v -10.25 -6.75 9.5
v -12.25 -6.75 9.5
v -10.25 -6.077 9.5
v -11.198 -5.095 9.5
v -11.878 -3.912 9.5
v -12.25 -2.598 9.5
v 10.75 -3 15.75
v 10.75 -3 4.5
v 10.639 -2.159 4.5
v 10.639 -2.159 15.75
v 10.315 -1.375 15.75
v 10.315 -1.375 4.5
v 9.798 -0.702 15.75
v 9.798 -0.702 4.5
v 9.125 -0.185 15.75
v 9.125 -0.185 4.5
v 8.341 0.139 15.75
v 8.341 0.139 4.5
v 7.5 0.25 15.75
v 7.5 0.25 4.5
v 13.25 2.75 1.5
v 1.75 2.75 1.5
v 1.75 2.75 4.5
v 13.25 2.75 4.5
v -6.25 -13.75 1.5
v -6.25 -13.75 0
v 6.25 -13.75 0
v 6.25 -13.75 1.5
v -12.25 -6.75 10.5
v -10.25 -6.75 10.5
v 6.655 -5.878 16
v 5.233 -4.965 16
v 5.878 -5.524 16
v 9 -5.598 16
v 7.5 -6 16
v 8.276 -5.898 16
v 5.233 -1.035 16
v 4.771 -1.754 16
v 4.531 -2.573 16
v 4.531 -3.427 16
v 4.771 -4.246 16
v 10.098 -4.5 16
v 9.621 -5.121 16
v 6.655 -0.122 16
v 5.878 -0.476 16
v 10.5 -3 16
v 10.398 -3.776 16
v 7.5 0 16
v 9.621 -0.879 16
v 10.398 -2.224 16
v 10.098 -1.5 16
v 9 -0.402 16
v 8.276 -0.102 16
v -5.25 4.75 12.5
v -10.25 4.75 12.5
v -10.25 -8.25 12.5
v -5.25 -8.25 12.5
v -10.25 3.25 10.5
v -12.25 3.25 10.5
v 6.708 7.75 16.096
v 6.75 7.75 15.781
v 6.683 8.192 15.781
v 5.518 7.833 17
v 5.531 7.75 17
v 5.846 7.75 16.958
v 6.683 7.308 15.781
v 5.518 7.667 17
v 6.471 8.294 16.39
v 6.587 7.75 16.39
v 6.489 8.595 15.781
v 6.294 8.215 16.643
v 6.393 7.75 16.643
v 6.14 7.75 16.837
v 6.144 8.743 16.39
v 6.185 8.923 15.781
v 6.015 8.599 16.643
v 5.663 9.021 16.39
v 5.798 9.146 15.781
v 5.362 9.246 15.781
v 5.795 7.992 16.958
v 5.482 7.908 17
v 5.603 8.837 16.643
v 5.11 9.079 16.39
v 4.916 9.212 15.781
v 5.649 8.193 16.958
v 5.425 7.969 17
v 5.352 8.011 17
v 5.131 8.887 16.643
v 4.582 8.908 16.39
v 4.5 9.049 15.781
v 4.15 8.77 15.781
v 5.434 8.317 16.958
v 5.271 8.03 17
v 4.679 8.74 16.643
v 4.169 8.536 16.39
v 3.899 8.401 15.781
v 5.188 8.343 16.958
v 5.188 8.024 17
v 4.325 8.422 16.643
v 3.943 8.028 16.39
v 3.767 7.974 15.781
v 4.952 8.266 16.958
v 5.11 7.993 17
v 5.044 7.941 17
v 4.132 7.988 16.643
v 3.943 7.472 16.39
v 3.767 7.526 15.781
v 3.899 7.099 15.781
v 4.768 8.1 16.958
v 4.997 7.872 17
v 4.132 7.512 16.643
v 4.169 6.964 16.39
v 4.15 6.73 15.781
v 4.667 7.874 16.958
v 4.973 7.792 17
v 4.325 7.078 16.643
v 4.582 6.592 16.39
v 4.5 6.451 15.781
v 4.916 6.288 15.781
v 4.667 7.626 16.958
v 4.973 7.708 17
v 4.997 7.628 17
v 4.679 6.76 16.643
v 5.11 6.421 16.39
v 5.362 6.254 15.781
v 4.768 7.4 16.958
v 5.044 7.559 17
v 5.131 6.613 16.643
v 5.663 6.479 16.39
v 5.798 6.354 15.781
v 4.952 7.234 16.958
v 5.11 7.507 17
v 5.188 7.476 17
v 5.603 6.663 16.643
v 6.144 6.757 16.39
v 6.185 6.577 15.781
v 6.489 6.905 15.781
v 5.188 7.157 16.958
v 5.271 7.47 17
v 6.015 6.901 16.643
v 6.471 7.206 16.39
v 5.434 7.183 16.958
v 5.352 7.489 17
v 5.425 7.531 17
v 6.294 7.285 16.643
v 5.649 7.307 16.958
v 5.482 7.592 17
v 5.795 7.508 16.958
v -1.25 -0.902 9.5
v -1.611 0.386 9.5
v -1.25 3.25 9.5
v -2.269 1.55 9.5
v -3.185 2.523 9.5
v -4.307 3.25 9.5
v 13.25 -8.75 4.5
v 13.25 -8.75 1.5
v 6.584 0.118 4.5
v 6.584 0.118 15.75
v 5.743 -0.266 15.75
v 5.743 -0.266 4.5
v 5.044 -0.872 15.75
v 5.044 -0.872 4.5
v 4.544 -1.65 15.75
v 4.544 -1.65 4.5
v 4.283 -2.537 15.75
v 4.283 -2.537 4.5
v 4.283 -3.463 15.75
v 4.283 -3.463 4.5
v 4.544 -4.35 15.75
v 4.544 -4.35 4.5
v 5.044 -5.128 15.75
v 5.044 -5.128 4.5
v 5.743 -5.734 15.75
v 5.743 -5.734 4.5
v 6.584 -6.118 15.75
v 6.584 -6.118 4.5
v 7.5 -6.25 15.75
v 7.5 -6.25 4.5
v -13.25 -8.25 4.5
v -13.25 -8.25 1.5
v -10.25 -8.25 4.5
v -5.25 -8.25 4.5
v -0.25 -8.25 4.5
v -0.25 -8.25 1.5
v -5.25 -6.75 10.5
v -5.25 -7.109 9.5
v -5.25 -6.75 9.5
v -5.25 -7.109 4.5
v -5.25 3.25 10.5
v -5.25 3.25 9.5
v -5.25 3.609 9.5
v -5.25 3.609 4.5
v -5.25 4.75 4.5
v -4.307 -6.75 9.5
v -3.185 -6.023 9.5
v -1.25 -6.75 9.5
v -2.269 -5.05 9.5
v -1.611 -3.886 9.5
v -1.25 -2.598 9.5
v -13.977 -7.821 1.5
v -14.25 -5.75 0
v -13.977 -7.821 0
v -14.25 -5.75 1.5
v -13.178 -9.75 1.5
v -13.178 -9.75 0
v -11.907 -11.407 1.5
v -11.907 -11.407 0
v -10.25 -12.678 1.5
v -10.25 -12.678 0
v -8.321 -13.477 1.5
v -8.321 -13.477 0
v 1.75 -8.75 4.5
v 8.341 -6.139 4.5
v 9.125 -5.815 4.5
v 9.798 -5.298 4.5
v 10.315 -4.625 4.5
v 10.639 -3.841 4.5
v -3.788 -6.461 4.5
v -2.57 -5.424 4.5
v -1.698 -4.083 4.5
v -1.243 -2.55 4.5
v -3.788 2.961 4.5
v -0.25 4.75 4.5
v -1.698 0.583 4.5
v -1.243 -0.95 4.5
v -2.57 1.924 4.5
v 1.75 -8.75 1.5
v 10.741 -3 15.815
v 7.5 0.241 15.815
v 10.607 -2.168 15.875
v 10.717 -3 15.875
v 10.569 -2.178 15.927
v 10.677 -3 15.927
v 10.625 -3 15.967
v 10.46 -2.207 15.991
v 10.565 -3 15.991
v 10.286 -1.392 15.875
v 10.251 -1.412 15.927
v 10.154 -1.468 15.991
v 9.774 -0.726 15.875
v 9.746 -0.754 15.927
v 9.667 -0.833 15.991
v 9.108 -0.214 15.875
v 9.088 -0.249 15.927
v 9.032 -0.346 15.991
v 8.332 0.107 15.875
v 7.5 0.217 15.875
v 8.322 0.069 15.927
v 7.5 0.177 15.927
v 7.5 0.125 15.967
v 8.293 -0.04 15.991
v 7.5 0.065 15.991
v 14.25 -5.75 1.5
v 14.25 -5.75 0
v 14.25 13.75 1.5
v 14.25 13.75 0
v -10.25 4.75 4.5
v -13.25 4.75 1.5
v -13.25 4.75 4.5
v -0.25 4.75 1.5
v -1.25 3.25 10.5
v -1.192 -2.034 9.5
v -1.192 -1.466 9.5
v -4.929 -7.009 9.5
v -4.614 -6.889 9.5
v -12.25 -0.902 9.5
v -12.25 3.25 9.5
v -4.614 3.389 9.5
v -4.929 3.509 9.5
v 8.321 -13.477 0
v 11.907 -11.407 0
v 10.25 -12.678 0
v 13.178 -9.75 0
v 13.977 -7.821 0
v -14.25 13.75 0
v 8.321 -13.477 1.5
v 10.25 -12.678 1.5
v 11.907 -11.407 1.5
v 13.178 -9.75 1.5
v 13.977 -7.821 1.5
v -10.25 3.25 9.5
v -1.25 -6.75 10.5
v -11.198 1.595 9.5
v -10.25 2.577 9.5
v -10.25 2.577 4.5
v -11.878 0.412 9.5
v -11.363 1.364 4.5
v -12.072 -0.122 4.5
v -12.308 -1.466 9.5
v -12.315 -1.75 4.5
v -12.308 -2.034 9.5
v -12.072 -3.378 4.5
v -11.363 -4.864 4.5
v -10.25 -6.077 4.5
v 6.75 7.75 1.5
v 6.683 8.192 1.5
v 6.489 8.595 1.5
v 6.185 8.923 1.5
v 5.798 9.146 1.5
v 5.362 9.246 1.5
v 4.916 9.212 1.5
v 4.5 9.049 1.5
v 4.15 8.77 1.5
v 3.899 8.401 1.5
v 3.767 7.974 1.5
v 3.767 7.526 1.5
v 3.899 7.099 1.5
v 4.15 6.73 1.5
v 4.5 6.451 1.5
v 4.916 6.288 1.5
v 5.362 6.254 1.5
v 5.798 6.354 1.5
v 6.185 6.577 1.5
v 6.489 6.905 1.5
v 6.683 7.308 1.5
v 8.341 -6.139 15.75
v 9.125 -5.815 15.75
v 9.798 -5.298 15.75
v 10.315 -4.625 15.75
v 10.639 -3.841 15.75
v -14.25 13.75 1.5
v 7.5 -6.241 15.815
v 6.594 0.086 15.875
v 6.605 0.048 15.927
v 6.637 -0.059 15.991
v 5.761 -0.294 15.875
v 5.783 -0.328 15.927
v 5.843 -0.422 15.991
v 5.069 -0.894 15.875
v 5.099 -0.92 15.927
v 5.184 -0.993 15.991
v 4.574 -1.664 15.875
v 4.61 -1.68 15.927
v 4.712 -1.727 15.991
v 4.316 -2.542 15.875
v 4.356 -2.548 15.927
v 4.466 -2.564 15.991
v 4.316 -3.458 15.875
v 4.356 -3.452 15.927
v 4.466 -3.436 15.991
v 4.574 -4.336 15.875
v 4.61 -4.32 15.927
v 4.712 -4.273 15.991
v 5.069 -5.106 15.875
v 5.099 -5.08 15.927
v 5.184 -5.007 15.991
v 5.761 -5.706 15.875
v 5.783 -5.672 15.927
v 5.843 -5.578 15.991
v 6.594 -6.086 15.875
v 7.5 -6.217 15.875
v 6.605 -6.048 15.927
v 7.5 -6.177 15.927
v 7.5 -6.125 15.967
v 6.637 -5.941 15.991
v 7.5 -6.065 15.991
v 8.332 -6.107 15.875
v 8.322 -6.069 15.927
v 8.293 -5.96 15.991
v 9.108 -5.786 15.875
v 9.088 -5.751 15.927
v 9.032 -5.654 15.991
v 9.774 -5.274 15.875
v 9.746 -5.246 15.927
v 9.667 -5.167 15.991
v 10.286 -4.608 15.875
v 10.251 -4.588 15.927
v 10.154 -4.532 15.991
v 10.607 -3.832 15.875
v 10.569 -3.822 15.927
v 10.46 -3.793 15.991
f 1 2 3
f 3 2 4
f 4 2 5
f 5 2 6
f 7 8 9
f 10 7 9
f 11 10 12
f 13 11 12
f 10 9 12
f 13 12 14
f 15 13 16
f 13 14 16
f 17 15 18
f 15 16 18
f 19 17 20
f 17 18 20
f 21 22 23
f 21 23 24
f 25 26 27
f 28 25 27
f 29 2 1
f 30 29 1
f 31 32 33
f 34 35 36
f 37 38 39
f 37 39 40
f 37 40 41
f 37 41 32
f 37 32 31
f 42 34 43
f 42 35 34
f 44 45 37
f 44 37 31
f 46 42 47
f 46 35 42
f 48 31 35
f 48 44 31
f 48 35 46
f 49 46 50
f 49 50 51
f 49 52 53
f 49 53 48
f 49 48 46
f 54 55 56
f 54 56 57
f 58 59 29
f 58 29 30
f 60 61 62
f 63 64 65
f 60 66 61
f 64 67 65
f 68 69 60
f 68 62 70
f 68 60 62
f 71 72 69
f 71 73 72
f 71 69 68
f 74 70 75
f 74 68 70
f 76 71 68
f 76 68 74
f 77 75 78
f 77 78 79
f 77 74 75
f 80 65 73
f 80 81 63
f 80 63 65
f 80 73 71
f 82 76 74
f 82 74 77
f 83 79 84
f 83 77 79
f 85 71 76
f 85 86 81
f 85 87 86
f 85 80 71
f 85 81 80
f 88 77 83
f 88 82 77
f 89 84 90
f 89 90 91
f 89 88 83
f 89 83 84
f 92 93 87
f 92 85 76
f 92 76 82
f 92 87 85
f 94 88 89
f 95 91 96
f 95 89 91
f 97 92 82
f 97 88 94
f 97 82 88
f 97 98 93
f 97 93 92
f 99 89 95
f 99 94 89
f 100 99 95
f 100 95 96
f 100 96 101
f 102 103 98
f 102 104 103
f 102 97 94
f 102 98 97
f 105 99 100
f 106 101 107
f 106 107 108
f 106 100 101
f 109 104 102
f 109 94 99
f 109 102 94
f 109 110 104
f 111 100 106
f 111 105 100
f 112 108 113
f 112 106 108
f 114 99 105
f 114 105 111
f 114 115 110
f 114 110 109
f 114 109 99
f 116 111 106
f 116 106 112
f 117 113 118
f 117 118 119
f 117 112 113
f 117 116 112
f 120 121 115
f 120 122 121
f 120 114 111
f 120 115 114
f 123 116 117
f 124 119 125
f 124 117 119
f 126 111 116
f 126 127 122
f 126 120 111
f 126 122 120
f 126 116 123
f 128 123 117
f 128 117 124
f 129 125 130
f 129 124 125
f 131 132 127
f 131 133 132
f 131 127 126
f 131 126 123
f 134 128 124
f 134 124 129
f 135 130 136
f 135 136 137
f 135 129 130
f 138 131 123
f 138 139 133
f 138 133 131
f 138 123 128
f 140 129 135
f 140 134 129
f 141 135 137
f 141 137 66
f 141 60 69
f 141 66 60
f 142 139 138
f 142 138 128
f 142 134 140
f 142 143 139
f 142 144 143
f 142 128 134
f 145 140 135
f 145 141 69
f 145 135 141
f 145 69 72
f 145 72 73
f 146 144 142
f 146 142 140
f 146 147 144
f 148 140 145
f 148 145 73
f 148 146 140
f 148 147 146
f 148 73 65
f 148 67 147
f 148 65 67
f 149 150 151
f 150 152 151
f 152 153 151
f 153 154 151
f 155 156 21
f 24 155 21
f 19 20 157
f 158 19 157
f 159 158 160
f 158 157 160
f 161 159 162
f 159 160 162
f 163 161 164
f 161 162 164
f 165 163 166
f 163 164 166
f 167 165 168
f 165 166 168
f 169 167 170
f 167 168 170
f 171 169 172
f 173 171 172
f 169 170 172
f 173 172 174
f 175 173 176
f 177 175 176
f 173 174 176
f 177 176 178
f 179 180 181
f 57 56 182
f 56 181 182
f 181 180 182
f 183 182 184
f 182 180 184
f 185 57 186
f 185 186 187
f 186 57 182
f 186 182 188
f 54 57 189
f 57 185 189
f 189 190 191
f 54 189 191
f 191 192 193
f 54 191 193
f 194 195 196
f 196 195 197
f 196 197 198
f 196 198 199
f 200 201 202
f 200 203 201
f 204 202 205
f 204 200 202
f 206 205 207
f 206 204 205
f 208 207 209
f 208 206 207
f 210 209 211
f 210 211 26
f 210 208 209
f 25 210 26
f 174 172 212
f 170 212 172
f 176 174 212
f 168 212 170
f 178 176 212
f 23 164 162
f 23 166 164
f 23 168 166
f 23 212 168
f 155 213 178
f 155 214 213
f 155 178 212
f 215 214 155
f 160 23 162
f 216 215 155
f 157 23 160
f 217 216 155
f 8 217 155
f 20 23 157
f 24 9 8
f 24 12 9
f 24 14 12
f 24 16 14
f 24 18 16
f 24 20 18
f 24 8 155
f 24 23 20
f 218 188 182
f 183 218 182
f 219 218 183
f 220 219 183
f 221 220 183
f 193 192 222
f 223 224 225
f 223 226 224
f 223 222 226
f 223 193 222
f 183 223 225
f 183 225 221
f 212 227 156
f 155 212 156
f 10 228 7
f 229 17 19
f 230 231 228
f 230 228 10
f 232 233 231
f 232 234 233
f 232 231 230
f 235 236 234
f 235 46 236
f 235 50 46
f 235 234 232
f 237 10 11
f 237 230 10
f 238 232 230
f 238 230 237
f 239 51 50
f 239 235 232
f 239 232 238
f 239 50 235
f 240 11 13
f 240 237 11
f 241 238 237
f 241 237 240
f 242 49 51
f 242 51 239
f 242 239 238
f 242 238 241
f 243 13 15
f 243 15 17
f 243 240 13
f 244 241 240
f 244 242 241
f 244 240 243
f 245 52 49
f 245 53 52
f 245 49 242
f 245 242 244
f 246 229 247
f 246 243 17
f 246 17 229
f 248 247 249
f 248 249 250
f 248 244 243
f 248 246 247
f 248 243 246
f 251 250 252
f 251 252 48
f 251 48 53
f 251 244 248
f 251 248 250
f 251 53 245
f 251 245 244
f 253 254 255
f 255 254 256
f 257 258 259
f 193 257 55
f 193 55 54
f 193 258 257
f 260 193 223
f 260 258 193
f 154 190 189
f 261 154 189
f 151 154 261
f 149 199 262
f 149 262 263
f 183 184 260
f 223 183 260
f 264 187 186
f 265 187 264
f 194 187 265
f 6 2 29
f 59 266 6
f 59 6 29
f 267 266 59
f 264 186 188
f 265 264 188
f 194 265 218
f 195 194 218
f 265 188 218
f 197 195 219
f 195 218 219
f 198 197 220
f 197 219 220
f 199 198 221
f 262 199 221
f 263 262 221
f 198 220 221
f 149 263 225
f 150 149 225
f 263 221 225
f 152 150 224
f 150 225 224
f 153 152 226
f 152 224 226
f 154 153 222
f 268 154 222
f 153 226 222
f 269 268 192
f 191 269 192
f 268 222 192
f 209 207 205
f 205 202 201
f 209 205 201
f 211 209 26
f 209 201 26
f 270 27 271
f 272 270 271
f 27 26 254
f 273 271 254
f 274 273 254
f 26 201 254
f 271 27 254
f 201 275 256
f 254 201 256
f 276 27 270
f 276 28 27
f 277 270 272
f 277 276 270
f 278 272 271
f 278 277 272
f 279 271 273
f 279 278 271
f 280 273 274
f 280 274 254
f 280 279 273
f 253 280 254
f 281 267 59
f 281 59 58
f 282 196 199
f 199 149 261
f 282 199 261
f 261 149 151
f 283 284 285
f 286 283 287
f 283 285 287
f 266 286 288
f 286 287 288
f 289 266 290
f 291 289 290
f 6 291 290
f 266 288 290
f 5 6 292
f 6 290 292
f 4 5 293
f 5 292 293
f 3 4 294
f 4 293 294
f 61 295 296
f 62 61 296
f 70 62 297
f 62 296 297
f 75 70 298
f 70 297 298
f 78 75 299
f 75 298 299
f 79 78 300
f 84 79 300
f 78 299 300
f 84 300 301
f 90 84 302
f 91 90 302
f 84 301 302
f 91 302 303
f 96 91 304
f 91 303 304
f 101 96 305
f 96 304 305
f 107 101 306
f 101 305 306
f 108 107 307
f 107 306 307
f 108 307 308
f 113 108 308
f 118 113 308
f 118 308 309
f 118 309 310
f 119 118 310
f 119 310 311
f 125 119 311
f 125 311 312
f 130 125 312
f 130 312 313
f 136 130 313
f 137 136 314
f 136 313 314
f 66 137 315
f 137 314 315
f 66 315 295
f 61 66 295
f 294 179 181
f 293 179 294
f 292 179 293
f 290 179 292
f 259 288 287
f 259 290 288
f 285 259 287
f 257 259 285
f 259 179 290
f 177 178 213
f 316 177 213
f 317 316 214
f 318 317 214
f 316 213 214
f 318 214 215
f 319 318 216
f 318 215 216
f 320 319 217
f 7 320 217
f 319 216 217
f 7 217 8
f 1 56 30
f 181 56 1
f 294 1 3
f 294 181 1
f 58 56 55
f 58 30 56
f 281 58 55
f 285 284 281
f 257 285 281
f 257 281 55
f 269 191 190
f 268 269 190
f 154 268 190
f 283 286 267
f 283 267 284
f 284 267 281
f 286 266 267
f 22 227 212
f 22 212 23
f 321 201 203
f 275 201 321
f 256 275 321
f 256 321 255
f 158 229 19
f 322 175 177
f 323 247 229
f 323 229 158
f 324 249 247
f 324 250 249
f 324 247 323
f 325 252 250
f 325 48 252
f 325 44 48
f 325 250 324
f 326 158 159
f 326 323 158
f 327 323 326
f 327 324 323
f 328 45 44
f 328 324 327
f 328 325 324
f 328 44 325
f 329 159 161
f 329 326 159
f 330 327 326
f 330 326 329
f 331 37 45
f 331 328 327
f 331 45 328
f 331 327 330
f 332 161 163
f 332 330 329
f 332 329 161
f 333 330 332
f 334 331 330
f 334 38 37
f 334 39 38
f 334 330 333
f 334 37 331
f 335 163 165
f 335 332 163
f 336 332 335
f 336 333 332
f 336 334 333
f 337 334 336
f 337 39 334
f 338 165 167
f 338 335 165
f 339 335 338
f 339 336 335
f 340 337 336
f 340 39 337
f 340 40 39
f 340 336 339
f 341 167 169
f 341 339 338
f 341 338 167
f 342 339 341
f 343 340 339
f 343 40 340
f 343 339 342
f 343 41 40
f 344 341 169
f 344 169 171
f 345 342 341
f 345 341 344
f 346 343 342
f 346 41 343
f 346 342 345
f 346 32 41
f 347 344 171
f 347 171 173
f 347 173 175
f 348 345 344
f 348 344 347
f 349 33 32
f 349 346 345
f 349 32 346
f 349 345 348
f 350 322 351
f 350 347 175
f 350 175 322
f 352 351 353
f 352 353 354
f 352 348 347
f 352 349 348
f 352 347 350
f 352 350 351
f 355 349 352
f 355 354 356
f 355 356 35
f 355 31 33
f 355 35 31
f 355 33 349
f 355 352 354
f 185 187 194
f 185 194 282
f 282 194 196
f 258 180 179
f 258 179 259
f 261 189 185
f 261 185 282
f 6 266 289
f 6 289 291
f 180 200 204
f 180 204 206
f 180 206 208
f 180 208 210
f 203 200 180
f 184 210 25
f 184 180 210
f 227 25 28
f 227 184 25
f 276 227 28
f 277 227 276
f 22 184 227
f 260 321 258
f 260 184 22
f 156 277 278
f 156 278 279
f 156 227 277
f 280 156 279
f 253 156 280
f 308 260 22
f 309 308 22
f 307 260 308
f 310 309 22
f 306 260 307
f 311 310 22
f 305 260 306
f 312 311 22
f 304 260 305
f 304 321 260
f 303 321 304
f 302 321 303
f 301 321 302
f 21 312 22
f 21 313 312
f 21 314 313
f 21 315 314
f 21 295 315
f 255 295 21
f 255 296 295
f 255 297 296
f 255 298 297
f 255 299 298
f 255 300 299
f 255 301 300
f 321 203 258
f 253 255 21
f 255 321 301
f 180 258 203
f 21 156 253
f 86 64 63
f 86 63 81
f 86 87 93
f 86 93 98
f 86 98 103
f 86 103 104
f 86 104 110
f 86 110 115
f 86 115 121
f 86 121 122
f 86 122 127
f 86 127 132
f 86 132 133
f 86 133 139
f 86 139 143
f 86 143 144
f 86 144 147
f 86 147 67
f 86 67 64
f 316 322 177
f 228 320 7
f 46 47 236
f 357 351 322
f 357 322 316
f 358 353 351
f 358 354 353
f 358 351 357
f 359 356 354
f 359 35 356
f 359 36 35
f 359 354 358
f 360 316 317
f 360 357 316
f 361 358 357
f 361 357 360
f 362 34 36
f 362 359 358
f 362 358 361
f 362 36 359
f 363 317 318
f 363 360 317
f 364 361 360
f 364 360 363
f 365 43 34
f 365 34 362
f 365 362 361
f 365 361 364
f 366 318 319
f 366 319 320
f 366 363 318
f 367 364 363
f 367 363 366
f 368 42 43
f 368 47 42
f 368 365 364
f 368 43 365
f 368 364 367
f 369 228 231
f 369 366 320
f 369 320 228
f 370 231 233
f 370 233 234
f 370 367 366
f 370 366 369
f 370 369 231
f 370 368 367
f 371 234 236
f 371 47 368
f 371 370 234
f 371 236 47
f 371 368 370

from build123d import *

# Parameters (mm, degrees)
F0_W           = 28.5
F0_H           = 27.5
F1_DEPTH       = 1.5
F2_R           = 8
F3_R           = 1.5
F4_DEPTH       = 15.5
F5_W           = 11.5
F5_H           = 11.5
F6_DEPTH       = 3
F8_DEPTH       = 11.5
F9_R           = 1.2194434125
F10_R          = 0.25
F11_W          = 13
F11_H          = 13
F11_R          = 5.5650544151
F12_DEPTH      = 3
F13_DEPTH      = 8
F14_W          = 5
F14_H          = 13
F15_DEPTH      = 8
F15_DEPTH_BACK = 3
F16_W          = 11
F16_H          = 10
F17_DEPTH      = 1


with BuildPart() as f1:
    # F0 (on Top) → F1 (new body)
    with BuildSketch(Plane.XY):
        Rectangle(F0_W, F0_H)
    extrude(amount=F1_DEPTH)

    # F2
    f2_edges = [f1.edges().sort_by_distance(p)[0] for p in [
        (14.25, -13.75, 0.75),
        (-14.25, -13.75, 0.75),
    ]]
    fillet(f2_edges, radius=F2_R)

    # F3 (on face) → F4 (join)
    with BuildSketch(Plane.XY.offset(1.5)):
        with Locations((5.25, 7.75)):
            Circle(F3_R)
    extrude(amount=F4_DEPTH)

    # F5 (on face) → F6 (join)
    with BuildSketch(Plane.XY.offset(1.5)):
        with Locations((7.5, -3)):
            Rectangle(F5_W, F5_H)
    extrude(amount=F6_DEPTH)

    # F7 (on face) → F8 (join)
    with BuildSketch(Plane.XY.offset(4.5)):
        with BuildLine():
            ThreePointArc((10.75, -3), (9.7980970389, -0.7019029611), (7.5, 0.25))
            Line((7.5, 0.25), (7.5, -6.25))
            ThreePointArc((7.5, -6.25), (9.7980970389, -5.2980970389), (10.75, -3))
        make_face()
        with BuildLine():
            Line((7.5, -6.25), (7.5, 0.25))
            ThreePointArc((7.5, 0.25), (4.25, -3), (7.5, -6.25))
        make_face()
    extrude(amount=F8_DEPTH)

    # F9
    f9_edges = [f1.edges().sort_by_distance(p)[0] for p in [
        (3.75, 7.75, 17),
    ]]
    fillet(f9_edges, radius=F9_R)

    # F10
    f10_edges = [f1.edges().sort_by_distance(p)[0] for p in [
        (4.25, -3, 16),
    ]]
    fillet(f10_edges, radius=F10_R)

    # F11 (on face) → F12 (join)
    with BuildSketch(Plane.XY.offset(1.5)):
        with Locations((-6.75, -1.75)):
            Rectangle(F11_W, F11_H)
        with Locations((-6.75, -1.75)):
            Circle(F11_R, mode=Mode.SUBTRACT)
    extrude(amount=F12_DEPTH)

    # F13 (add): a face of the model
    f13_faces = [f1.faces().sort_by_distance(p)[0] for p in [
        (-6.75, -1.75, 1.5),
    ]]
    extrude(f13_faces, amount=F13_DEPTH)

    # F14 (on face) → F15 (join, two sides)
    with BuildSketch(Plane.XY.offset(9.5)) as f15_sk:
        with Locations((-7.75, -1.75)):
            Rectangle(F14_W, F14_H)
    extrude(amount=-F15_DEPTH)
    extrude(f15_sk.sketch, amount=F15_DEPTH_BACK)

    # F16 (on face) → F17 (join)
    with BuildSketch(Plane.XY.offset(9.5)):
        with Locations((-6.75, -1.75)):
            Rectangle(F16_W, F16_H)
    extrude(amount=F17_DEPTH)


solid = f1.part
